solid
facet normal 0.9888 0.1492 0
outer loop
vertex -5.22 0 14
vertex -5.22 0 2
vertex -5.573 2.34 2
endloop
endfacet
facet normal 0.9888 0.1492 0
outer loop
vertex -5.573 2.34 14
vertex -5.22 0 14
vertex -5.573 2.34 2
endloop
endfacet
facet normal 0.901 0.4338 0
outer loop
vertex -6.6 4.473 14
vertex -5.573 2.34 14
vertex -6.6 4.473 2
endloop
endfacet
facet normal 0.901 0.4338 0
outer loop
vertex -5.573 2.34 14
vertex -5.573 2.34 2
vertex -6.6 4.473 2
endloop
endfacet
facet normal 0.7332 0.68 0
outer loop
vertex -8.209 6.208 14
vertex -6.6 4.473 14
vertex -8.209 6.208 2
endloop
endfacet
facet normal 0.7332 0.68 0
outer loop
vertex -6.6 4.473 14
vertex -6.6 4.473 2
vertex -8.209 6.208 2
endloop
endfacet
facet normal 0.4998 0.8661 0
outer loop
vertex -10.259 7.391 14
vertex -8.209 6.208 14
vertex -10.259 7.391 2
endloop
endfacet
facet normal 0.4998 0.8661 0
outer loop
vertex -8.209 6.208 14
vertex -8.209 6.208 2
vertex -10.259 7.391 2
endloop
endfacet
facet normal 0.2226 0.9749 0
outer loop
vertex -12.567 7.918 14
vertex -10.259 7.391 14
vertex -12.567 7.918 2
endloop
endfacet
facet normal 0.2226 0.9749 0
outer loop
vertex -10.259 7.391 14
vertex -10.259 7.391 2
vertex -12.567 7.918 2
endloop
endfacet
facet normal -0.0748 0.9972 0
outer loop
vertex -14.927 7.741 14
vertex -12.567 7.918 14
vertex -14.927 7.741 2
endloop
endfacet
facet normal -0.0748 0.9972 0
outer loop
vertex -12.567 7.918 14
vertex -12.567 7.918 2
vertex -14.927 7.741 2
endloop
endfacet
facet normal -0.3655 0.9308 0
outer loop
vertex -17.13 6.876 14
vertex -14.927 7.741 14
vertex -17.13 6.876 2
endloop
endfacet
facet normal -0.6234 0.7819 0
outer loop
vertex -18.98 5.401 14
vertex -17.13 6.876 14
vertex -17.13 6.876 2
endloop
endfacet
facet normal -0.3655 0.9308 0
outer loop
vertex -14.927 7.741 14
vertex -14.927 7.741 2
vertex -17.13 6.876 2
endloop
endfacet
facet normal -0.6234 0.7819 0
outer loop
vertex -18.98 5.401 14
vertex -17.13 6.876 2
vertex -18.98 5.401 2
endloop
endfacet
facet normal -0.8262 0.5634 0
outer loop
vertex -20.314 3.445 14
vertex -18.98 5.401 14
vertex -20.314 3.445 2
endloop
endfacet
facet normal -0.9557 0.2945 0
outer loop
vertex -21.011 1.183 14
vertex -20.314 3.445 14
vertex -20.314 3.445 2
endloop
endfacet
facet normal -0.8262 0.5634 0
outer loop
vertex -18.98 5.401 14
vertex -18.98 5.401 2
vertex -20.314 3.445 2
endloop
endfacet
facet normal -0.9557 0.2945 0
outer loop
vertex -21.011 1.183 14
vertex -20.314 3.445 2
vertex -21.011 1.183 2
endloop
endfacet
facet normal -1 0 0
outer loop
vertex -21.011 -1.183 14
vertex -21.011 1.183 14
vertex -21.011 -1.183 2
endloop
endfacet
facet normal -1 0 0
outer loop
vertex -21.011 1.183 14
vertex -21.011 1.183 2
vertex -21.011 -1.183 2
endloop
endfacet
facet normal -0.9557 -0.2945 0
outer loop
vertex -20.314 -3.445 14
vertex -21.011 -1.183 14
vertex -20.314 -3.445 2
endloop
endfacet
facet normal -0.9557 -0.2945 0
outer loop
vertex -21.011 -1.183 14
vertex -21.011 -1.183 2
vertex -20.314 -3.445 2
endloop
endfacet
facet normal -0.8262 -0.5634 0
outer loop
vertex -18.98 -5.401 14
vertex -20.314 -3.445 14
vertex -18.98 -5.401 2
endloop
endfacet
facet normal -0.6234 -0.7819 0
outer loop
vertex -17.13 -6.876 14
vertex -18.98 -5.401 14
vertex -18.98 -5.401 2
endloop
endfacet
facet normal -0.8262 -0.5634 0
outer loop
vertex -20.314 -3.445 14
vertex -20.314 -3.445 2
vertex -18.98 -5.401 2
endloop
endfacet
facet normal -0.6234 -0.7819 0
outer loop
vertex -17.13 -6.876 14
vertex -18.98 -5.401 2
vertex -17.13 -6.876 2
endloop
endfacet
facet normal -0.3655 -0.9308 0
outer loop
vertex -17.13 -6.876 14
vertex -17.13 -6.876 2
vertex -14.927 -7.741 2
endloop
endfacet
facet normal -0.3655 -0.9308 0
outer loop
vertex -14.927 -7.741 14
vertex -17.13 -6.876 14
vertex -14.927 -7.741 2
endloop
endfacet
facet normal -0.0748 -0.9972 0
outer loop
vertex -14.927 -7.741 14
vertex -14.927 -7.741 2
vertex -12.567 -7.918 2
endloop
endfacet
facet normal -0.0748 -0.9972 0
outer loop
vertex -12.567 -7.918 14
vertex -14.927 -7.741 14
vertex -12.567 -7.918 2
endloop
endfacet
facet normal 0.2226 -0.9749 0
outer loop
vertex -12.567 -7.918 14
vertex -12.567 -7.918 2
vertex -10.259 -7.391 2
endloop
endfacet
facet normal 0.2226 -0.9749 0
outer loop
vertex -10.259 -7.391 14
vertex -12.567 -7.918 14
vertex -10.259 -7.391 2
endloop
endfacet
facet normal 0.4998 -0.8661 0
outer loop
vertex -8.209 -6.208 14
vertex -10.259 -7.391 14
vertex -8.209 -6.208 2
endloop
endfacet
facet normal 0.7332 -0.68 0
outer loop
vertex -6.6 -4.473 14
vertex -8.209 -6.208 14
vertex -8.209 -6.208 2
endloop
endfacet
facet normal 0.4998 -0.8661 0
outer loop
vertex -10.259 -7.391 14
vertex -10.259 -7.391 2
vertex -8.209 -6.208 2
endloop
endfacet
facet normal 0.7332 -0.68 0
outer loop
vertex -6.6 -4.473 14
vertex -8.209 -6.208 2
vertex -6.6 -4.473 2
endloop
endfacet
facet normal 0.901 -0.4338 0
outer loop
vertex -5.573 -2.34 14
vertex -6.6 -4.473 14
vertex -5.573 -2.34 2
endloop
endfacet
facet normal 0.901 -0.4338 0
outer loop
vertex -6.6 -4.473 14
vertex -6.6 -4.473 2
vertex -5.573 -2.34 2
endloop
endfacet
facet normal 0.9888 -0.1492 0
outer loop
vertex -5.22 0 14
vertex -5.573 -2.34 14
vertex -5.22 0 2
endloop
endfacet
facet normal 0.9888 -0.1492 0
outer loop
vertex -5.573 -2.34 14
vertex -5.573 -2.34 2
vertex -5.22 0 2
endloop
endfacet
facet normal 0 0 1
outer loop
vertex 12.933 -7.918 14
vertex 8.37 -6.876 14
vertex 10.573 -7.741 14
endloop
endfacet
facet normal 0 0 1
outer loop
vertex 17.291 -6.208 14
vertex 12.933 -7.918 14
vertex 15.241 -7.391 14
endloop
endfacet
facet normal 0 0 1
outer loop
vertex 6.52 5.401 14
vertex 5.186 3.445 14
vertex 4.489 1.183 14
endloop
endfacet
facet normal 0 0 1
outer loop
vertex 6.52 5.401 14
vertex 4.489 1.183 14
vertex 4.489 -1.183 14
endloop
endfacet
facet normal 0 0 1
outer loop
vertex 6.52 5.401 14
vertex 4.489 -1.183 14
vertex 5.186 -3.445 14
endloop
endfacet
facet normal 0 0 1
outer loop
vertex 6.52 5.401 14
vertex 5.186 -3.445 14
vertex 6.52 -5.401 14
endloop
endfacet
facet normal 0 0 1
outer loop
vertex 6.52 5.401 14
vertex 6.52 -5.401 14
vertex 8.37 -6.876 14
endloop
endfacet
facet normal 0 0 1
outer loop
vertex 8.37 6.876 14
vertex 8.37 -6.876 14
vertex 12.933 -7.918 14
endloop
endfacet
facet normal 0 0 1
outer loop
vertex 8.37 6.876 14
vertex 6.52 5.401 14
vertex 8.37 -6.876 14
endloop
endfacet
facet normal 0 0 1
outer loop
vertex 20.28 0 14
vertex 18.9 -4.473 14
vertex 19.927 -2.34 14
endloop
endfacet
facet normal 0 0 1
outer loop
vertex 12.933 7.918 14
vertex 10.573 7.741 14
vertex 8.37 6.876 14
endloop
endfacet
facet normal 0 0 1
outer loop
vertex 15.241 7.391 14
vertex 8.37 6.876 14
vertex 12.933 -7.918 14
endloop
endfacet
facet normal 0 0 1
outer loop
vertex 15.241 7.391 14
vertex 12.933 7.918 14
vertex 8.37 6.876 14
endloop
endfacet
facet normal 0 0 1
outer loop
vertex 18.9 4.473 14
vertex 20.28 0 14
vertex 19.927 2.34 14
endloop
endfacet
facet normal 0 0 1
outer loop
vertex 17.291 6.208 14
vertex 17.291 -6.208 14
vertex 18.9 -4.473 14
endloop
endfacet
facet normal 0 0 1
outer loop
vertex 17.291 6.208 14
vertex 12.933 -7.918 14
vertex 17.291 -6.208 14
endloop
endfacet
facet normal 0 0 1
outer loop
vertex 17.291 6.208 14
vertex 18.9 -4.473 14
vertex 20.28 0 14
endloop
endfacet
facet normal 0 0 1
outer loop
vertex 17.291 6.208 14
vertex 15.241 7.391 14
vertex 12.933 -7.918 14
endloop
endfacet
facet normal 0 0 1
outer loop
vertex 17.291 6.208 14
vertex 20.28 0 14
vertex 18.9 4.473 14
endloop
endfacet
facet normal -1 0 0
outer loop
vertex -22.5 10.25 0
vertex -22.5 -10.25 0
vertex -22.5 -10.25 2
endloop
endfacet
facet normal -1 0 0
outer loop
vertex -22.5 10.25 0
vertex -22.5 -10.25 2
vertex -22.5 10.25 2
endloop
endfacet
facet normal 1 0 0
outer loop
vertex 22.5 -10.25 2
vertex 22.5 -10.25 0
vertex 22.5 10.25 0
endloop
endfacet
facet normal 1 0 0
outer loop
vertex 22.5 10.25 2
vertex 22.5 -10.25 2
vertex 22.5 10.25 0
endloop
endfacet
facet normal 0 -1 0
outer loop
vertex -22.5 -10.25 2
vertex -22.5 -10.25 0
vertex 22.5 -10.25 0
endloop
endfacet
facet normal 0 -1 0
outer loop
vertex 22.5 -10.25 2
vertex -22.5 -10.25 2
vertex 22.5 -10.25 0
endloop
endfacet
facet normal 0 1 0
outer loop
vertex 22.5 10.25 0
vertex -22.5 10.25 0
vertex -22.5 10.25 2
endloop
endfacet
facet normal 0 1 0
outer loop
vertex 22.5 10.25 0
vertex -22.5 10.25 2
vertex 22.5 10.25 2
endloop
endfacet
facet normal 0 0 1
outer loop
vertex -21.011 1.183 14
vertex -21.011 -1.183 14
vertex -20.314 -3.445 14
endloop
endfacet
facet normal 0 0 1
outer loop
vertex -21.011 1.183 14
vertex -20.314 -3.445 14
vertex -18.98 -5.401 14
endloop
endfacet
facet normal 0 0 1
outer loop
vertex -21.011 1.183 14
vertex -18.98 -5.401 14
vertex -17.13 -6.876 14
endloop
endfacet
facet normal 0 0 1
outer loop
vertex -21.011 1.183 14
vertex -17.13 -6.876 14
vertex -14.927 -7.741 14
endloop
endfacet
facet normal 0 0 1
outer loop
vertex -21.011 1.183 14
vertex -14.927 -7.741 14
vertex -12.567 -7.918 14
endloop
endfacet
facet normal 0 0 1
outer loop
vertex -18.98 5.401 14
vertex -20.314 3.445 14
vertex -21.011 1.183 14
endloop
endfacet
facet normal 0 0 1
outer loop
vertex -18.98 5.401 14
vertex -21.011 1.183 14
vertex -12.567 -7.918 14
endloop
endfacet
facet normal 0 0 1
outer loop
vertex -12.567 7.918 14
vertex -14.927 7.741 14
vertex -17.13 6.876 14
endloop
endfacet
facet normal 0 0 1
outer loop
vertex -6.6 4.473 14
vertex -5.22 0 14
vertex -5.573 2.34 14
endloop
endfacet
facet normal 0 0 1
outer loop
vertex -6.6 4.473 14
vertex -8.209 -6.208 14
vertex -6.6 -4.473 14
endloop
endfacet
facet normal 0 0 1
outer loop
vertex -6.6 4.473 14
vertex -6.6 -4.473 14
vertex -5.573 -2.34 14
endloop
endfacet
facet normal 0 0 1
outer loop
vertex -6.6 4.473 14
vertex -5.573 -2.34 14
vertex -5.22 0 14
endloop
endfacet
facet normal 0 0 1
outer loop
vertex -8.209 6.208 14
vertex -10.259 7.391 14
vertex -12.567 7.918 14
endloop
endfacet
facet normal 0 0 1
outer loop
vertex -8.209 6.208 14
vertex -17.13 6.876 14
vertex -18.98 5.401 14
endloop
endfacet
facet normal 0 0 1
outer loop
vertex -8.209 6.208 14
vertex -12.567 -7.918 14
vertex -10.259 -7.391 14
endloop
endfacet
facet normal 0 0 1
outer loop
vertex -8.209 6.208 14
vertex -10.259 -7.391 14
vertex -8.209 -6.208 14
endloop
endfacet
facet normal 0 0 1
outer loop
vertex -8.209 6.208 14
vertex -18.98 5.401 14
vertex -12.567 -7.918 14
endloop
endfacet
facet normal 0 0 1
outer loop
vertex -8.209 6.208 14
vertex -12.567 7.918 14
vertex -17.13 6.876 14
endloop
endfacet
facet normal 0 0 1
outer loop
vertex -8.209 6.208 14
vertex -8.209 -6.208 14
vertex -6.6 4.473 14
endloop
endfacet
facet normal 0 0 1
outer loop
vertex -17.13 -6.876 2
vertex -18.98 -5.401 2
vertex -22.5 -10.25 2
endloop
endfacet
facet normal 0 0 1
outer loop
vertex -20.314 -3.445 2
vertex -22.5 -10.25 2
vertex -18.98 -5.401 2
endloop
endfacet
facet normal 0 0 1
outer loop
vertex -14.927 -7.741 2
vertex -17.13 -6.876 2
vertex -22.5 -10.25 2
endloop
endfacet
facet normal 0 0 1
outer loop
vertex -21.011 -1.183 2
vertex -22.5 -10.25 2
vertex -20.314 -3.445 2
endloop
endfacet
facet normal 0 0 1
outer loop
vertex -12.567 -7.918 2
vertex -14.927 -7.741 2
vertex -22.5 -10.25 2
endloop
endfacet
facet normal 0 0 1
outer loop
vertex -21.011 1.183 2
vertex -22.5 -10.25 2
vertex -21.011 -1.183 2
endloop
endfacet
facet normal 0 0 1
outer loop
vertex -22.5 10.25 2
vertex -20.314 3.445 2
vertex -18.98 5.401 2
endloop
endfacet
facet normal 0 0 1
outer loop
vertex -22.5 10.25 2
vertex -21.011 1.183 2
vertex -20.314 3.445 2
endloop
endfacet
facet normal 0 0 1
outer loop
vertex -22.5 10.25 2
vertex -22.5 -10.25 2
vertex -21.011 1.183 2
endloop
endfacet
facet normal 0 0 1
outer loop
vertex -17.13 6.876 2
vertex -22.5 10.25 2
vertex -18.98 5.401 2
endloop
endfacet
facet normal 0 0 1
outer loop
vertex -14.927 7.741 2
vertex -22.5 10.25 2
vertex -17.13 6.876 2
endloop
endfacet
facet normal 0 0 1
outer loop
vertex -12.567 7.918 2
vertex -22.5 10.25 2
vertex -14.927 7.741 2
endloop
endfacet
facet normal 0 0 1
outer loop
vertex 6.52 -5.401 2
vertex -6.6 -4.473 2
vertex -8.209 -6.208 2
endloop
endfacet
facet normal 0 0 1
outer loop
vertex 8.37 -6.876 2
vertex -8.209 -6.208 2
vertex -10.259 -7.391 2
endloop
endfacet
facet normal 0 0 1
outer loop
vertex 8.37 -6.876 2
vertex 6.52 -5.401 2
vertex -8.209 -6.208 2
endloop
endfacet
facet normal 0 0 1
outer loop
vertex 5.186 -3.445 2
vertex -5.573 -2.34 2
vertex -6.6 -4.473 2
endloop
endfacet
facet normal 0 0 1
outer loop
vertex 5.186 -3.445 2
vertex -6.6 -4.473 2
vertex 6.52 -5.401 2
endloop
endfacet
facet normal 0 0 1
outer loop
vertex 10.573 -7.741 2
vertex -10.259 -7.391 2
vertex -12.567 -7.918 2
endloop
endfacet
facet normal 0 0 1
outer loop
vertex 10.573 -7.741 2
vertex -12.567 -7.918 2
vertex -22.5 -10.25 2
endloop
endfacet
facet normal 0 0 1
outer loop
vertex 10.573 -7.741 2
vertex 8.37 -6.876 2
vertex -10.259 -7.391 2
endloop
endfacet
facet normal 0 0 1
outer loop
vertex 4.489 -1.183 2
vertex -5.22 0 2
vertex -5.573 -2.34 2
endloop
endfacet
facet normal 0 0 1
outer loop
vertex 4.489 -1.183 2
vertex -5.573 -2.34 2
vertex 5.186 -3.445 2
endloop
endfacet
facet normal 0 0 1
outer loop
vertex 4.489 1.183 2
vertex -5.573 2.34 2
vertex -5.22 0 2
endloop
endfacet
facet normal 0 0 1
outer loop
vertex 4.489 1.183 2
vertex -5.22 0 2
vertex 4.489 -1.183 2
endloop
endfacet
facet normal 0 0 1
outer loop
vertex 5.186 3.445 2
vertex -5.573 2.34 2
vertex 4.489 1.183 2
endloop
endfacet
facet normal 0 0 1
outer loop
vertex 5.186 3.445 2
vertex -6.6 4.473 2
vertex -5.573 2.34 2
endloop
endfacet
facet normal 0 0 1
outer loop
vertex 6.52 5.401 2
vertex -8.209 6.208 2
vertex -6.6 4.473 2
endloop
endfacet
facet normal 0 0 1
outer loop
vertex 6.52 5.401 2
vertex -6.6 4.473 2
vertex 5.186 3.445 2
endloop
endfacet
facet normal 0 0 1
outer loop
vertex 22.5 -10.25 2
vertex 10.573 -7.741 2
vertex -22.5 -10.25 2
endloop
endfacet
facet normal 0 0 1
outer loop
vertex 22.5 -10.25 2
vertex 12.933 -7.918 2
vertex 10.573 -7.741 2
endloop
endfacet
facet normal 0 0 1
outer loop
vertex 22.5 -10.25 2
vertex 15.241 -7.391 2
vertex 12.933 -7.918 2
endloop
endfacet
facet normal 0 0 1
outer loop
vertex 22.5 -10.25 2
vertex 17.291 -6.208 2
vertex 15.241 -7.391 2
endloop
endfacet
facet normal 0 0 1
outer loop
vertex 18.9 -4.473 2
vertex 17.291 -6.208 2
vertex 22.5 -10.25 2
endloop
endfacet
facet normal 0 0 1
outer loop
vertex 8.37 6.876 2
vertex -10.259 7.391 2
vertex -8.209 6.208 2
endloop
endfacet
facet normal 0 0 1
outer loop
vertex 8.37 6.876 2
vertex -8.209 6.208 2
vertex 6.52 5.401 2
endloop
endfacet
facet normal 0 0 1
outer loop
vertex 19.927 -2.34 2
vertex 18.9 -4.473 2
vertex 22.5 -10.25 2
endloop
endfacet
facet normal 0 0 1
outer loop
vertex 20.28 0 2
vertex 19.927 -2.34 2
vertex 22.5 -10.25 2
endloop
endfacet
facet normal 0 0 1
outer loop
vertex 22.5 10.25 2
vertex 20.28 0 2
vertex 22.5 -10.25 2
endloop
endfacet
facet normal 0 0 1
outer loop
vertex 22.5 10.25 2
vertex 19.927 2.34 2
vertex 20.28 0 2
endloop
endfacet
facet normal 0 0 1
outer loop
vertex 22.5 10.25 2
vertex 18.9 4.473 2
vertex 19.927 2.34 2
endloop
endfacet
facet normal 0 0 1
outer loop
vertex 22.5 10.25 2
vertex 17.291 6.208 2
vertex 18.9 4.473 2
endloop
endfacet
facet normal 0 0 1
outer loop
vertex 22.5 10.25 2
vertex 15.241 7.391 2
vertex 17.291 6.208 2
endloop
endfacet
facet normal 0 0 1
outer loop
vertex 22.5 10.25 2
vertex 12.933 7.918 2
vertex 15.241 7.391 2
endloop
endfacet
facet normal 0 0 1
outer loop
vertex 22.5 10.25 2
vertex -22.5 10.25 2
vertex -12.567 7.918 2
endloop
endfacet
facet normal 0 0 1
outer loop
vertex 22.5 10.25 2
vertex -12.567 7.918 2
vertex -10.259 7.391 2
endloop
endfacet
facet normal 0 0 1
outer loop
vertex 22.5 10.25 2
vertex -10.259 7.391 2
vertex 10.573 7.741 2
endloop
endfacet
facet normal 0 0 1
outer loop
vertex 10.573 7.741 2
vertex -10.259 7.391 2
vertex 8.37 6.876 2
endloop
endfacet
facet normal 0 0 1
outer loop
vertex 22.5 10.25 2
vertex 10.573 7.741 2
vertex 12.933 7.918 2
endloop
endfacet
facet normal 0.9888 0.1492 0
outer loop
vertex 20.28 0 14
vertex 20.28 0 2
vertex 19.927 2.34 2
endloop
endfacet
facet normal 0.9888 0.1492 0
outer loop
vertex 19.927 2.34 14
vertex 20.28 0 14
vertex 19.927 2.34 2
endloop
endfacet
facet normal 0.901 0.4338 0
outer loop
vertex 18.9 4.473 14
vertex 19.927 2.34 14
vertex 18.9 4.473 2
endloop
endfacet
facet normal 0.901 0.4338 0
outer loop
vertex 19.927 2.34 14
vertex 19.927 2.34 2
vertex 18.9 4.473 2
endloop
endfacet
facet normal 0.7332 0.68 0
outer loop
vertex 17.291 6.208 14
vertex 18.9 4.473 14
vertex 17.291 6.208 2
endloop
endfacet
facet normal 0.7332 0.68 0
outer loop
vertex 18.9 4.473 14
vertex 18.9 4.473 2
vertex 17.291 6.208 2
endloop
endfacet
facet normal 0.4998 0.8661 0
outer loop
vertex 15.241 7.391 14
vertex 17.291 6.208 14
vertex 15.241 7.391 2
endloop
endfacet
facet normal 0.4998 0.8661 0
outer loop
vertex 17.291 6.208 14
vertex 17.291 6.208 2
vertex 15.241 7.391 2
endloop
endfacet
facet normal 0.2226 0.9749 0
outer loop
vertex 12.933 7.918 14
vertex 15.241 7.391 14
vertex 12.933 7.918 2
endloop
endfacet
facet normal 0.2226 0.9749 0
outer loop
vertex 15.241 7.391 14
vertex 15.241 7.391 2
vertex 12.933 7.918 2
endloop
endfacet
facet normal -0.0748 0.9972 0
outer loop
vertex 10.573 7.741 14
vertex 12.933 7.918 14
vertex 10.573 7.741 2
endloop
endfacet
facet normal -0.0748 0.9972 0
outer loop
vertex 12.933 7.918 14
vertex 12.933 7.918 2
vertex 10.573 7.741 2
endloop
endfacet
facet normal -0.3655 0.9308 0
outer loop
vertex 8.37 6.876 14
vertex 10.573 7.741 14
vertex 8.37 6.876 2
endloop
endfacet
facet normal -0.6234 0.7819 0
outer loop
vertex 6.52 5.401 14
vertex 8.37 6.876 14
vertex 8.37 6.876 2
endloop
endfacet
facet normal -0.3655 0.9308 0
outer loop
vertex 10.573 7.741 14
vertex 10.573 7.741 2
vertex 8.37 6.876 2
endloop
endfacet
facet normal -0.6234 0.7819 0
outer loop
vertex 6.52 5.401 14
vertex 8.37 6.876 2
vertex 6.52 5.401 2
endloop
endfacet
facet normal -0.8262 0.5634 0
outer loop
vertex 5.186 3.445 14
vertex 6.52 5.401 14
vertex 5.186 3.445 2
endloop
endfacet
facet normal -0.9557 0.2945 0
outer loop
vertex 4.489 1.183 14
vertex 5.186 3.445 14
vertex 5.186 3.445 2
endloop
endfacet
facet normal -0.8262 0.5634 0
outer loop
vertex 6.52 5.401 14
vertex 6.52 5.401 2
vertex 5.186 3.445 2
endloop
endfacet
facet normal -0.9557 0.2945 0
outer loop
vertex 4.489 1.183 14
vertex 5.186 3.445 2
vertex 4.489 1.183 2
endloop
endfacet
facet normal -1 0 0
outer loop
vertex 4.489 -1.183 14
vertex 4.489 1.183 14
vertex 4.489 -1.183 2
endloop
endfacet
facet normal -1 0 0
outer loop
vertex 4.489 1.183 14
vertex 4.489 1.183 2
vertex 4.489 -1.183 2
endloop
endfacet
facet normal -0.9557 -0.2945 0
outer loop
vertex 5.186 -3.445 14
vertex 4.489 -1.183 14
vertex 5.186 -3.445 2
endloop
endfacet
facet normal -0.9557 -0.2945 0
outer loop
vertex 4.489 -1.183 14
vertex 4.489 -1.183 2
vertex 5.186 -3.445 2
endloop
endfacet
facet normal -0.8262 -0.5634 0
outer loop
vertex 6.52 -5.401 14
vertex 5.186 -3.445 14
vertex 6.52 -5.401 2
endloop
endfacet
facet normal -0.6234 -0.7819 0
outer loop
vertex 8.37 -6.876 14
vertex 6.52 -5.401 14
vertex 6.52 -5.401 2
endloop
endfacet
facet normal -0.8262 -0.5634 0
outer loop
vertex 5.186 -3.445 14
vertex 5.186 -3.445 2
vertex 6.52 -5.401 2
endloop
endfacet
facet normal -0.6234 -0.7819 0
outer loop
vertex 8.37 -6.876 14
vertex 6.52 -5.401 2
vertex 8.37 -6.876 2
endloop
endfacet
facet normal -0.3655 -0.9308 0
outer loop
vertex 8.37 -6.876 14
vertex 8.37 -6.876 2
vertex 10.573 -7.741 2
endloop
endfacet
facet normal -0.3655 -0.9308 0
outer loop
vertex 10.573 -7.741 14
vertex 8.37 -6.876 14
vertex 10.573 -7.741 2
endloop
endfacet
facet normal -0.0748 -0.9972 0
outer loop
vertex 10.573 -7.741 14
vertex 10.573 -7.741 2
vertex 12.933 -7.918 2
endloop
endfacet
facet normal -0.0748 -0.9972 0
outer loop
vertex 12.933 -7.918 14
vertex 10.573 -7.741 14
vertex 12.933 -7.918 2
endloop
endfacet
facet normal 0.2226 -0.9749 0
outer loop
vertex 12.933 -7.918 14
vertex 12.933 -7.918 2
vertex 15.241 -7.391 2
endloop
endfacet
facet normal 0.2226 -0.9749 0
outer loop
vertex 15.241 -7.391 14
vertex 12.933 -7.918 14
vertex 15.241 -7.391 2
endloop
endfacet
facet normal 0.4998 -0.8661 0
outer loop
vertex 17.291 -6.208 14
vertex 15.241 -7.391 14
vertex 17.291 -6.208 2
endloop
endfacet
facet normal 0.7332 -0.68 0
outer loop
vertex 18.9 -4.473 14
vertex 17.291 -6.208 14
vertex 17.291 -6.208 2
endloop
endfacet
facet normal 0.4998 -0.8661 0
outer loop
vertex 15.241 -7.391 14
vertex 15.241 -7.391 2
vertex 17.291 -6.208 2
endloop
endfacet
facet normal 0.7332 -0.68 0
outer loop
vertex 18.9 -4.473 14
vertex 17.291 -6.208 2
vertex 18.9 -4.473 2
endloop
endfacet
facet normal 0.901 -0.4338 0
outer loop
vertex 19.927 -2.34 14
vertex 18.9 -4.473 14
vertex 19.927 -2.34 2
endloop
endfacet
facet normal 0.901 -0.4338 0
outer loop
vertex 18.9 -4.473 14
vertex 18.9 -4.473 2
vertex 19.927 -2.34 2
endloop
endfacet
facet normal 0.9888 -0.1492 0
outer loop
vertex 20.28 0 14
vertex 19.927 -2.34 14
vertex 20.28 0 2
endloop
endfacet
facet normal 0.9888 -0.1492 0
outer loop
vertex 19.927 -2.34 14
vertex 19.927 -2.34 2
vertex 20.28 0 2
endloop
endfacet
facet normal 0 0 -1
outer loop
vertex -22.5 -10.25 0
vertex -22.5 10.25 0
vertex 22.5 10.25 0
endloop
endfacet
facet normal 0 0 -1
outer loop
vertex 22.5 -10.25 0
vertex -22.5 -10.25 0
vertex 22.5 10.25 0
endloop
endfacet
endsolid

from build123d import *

# Parameters (mm, degrees)
SKETCH_1_W      = 45
SKETCH_1_H      = 20.5
EXTRUDE_1_DEPTH = 2
SKETCH_2_R      = 7.94
EXTRUDE_2_DEPTH = 12
SKETCH_3_R      = 7.94
EXTRUDE_3_DEPTH = 12


with BuildPart() as part:
    # 스케치1 → 보스-돌출1 (new body)
    with BuildSketch(Plane.XY):
        Rectangle(SKETCH_1_W, SKETCH_1_H)
    extrude(amount=EXTRUDE_1_DEPTH)

    # 스케치2 → 보스-돌출2 (add)
    with BuildSketch(Plane.XY.offset(2)):
        with Locations((-13.16, 0)):
            Circle(SKETCH_2_R)
    extrude(amount=EXTRUDE_2_DEPTH)

    # 스케치3 → 보스-돌출3 (add)
    with BuildSketch(Plane.XY.offset(2)):
        with Locations((12.34, 0)):
            Circle(SKETCH_3_R)
    extrude(amount=EXTRUDE_3_DEPTH)


solid = part.part
